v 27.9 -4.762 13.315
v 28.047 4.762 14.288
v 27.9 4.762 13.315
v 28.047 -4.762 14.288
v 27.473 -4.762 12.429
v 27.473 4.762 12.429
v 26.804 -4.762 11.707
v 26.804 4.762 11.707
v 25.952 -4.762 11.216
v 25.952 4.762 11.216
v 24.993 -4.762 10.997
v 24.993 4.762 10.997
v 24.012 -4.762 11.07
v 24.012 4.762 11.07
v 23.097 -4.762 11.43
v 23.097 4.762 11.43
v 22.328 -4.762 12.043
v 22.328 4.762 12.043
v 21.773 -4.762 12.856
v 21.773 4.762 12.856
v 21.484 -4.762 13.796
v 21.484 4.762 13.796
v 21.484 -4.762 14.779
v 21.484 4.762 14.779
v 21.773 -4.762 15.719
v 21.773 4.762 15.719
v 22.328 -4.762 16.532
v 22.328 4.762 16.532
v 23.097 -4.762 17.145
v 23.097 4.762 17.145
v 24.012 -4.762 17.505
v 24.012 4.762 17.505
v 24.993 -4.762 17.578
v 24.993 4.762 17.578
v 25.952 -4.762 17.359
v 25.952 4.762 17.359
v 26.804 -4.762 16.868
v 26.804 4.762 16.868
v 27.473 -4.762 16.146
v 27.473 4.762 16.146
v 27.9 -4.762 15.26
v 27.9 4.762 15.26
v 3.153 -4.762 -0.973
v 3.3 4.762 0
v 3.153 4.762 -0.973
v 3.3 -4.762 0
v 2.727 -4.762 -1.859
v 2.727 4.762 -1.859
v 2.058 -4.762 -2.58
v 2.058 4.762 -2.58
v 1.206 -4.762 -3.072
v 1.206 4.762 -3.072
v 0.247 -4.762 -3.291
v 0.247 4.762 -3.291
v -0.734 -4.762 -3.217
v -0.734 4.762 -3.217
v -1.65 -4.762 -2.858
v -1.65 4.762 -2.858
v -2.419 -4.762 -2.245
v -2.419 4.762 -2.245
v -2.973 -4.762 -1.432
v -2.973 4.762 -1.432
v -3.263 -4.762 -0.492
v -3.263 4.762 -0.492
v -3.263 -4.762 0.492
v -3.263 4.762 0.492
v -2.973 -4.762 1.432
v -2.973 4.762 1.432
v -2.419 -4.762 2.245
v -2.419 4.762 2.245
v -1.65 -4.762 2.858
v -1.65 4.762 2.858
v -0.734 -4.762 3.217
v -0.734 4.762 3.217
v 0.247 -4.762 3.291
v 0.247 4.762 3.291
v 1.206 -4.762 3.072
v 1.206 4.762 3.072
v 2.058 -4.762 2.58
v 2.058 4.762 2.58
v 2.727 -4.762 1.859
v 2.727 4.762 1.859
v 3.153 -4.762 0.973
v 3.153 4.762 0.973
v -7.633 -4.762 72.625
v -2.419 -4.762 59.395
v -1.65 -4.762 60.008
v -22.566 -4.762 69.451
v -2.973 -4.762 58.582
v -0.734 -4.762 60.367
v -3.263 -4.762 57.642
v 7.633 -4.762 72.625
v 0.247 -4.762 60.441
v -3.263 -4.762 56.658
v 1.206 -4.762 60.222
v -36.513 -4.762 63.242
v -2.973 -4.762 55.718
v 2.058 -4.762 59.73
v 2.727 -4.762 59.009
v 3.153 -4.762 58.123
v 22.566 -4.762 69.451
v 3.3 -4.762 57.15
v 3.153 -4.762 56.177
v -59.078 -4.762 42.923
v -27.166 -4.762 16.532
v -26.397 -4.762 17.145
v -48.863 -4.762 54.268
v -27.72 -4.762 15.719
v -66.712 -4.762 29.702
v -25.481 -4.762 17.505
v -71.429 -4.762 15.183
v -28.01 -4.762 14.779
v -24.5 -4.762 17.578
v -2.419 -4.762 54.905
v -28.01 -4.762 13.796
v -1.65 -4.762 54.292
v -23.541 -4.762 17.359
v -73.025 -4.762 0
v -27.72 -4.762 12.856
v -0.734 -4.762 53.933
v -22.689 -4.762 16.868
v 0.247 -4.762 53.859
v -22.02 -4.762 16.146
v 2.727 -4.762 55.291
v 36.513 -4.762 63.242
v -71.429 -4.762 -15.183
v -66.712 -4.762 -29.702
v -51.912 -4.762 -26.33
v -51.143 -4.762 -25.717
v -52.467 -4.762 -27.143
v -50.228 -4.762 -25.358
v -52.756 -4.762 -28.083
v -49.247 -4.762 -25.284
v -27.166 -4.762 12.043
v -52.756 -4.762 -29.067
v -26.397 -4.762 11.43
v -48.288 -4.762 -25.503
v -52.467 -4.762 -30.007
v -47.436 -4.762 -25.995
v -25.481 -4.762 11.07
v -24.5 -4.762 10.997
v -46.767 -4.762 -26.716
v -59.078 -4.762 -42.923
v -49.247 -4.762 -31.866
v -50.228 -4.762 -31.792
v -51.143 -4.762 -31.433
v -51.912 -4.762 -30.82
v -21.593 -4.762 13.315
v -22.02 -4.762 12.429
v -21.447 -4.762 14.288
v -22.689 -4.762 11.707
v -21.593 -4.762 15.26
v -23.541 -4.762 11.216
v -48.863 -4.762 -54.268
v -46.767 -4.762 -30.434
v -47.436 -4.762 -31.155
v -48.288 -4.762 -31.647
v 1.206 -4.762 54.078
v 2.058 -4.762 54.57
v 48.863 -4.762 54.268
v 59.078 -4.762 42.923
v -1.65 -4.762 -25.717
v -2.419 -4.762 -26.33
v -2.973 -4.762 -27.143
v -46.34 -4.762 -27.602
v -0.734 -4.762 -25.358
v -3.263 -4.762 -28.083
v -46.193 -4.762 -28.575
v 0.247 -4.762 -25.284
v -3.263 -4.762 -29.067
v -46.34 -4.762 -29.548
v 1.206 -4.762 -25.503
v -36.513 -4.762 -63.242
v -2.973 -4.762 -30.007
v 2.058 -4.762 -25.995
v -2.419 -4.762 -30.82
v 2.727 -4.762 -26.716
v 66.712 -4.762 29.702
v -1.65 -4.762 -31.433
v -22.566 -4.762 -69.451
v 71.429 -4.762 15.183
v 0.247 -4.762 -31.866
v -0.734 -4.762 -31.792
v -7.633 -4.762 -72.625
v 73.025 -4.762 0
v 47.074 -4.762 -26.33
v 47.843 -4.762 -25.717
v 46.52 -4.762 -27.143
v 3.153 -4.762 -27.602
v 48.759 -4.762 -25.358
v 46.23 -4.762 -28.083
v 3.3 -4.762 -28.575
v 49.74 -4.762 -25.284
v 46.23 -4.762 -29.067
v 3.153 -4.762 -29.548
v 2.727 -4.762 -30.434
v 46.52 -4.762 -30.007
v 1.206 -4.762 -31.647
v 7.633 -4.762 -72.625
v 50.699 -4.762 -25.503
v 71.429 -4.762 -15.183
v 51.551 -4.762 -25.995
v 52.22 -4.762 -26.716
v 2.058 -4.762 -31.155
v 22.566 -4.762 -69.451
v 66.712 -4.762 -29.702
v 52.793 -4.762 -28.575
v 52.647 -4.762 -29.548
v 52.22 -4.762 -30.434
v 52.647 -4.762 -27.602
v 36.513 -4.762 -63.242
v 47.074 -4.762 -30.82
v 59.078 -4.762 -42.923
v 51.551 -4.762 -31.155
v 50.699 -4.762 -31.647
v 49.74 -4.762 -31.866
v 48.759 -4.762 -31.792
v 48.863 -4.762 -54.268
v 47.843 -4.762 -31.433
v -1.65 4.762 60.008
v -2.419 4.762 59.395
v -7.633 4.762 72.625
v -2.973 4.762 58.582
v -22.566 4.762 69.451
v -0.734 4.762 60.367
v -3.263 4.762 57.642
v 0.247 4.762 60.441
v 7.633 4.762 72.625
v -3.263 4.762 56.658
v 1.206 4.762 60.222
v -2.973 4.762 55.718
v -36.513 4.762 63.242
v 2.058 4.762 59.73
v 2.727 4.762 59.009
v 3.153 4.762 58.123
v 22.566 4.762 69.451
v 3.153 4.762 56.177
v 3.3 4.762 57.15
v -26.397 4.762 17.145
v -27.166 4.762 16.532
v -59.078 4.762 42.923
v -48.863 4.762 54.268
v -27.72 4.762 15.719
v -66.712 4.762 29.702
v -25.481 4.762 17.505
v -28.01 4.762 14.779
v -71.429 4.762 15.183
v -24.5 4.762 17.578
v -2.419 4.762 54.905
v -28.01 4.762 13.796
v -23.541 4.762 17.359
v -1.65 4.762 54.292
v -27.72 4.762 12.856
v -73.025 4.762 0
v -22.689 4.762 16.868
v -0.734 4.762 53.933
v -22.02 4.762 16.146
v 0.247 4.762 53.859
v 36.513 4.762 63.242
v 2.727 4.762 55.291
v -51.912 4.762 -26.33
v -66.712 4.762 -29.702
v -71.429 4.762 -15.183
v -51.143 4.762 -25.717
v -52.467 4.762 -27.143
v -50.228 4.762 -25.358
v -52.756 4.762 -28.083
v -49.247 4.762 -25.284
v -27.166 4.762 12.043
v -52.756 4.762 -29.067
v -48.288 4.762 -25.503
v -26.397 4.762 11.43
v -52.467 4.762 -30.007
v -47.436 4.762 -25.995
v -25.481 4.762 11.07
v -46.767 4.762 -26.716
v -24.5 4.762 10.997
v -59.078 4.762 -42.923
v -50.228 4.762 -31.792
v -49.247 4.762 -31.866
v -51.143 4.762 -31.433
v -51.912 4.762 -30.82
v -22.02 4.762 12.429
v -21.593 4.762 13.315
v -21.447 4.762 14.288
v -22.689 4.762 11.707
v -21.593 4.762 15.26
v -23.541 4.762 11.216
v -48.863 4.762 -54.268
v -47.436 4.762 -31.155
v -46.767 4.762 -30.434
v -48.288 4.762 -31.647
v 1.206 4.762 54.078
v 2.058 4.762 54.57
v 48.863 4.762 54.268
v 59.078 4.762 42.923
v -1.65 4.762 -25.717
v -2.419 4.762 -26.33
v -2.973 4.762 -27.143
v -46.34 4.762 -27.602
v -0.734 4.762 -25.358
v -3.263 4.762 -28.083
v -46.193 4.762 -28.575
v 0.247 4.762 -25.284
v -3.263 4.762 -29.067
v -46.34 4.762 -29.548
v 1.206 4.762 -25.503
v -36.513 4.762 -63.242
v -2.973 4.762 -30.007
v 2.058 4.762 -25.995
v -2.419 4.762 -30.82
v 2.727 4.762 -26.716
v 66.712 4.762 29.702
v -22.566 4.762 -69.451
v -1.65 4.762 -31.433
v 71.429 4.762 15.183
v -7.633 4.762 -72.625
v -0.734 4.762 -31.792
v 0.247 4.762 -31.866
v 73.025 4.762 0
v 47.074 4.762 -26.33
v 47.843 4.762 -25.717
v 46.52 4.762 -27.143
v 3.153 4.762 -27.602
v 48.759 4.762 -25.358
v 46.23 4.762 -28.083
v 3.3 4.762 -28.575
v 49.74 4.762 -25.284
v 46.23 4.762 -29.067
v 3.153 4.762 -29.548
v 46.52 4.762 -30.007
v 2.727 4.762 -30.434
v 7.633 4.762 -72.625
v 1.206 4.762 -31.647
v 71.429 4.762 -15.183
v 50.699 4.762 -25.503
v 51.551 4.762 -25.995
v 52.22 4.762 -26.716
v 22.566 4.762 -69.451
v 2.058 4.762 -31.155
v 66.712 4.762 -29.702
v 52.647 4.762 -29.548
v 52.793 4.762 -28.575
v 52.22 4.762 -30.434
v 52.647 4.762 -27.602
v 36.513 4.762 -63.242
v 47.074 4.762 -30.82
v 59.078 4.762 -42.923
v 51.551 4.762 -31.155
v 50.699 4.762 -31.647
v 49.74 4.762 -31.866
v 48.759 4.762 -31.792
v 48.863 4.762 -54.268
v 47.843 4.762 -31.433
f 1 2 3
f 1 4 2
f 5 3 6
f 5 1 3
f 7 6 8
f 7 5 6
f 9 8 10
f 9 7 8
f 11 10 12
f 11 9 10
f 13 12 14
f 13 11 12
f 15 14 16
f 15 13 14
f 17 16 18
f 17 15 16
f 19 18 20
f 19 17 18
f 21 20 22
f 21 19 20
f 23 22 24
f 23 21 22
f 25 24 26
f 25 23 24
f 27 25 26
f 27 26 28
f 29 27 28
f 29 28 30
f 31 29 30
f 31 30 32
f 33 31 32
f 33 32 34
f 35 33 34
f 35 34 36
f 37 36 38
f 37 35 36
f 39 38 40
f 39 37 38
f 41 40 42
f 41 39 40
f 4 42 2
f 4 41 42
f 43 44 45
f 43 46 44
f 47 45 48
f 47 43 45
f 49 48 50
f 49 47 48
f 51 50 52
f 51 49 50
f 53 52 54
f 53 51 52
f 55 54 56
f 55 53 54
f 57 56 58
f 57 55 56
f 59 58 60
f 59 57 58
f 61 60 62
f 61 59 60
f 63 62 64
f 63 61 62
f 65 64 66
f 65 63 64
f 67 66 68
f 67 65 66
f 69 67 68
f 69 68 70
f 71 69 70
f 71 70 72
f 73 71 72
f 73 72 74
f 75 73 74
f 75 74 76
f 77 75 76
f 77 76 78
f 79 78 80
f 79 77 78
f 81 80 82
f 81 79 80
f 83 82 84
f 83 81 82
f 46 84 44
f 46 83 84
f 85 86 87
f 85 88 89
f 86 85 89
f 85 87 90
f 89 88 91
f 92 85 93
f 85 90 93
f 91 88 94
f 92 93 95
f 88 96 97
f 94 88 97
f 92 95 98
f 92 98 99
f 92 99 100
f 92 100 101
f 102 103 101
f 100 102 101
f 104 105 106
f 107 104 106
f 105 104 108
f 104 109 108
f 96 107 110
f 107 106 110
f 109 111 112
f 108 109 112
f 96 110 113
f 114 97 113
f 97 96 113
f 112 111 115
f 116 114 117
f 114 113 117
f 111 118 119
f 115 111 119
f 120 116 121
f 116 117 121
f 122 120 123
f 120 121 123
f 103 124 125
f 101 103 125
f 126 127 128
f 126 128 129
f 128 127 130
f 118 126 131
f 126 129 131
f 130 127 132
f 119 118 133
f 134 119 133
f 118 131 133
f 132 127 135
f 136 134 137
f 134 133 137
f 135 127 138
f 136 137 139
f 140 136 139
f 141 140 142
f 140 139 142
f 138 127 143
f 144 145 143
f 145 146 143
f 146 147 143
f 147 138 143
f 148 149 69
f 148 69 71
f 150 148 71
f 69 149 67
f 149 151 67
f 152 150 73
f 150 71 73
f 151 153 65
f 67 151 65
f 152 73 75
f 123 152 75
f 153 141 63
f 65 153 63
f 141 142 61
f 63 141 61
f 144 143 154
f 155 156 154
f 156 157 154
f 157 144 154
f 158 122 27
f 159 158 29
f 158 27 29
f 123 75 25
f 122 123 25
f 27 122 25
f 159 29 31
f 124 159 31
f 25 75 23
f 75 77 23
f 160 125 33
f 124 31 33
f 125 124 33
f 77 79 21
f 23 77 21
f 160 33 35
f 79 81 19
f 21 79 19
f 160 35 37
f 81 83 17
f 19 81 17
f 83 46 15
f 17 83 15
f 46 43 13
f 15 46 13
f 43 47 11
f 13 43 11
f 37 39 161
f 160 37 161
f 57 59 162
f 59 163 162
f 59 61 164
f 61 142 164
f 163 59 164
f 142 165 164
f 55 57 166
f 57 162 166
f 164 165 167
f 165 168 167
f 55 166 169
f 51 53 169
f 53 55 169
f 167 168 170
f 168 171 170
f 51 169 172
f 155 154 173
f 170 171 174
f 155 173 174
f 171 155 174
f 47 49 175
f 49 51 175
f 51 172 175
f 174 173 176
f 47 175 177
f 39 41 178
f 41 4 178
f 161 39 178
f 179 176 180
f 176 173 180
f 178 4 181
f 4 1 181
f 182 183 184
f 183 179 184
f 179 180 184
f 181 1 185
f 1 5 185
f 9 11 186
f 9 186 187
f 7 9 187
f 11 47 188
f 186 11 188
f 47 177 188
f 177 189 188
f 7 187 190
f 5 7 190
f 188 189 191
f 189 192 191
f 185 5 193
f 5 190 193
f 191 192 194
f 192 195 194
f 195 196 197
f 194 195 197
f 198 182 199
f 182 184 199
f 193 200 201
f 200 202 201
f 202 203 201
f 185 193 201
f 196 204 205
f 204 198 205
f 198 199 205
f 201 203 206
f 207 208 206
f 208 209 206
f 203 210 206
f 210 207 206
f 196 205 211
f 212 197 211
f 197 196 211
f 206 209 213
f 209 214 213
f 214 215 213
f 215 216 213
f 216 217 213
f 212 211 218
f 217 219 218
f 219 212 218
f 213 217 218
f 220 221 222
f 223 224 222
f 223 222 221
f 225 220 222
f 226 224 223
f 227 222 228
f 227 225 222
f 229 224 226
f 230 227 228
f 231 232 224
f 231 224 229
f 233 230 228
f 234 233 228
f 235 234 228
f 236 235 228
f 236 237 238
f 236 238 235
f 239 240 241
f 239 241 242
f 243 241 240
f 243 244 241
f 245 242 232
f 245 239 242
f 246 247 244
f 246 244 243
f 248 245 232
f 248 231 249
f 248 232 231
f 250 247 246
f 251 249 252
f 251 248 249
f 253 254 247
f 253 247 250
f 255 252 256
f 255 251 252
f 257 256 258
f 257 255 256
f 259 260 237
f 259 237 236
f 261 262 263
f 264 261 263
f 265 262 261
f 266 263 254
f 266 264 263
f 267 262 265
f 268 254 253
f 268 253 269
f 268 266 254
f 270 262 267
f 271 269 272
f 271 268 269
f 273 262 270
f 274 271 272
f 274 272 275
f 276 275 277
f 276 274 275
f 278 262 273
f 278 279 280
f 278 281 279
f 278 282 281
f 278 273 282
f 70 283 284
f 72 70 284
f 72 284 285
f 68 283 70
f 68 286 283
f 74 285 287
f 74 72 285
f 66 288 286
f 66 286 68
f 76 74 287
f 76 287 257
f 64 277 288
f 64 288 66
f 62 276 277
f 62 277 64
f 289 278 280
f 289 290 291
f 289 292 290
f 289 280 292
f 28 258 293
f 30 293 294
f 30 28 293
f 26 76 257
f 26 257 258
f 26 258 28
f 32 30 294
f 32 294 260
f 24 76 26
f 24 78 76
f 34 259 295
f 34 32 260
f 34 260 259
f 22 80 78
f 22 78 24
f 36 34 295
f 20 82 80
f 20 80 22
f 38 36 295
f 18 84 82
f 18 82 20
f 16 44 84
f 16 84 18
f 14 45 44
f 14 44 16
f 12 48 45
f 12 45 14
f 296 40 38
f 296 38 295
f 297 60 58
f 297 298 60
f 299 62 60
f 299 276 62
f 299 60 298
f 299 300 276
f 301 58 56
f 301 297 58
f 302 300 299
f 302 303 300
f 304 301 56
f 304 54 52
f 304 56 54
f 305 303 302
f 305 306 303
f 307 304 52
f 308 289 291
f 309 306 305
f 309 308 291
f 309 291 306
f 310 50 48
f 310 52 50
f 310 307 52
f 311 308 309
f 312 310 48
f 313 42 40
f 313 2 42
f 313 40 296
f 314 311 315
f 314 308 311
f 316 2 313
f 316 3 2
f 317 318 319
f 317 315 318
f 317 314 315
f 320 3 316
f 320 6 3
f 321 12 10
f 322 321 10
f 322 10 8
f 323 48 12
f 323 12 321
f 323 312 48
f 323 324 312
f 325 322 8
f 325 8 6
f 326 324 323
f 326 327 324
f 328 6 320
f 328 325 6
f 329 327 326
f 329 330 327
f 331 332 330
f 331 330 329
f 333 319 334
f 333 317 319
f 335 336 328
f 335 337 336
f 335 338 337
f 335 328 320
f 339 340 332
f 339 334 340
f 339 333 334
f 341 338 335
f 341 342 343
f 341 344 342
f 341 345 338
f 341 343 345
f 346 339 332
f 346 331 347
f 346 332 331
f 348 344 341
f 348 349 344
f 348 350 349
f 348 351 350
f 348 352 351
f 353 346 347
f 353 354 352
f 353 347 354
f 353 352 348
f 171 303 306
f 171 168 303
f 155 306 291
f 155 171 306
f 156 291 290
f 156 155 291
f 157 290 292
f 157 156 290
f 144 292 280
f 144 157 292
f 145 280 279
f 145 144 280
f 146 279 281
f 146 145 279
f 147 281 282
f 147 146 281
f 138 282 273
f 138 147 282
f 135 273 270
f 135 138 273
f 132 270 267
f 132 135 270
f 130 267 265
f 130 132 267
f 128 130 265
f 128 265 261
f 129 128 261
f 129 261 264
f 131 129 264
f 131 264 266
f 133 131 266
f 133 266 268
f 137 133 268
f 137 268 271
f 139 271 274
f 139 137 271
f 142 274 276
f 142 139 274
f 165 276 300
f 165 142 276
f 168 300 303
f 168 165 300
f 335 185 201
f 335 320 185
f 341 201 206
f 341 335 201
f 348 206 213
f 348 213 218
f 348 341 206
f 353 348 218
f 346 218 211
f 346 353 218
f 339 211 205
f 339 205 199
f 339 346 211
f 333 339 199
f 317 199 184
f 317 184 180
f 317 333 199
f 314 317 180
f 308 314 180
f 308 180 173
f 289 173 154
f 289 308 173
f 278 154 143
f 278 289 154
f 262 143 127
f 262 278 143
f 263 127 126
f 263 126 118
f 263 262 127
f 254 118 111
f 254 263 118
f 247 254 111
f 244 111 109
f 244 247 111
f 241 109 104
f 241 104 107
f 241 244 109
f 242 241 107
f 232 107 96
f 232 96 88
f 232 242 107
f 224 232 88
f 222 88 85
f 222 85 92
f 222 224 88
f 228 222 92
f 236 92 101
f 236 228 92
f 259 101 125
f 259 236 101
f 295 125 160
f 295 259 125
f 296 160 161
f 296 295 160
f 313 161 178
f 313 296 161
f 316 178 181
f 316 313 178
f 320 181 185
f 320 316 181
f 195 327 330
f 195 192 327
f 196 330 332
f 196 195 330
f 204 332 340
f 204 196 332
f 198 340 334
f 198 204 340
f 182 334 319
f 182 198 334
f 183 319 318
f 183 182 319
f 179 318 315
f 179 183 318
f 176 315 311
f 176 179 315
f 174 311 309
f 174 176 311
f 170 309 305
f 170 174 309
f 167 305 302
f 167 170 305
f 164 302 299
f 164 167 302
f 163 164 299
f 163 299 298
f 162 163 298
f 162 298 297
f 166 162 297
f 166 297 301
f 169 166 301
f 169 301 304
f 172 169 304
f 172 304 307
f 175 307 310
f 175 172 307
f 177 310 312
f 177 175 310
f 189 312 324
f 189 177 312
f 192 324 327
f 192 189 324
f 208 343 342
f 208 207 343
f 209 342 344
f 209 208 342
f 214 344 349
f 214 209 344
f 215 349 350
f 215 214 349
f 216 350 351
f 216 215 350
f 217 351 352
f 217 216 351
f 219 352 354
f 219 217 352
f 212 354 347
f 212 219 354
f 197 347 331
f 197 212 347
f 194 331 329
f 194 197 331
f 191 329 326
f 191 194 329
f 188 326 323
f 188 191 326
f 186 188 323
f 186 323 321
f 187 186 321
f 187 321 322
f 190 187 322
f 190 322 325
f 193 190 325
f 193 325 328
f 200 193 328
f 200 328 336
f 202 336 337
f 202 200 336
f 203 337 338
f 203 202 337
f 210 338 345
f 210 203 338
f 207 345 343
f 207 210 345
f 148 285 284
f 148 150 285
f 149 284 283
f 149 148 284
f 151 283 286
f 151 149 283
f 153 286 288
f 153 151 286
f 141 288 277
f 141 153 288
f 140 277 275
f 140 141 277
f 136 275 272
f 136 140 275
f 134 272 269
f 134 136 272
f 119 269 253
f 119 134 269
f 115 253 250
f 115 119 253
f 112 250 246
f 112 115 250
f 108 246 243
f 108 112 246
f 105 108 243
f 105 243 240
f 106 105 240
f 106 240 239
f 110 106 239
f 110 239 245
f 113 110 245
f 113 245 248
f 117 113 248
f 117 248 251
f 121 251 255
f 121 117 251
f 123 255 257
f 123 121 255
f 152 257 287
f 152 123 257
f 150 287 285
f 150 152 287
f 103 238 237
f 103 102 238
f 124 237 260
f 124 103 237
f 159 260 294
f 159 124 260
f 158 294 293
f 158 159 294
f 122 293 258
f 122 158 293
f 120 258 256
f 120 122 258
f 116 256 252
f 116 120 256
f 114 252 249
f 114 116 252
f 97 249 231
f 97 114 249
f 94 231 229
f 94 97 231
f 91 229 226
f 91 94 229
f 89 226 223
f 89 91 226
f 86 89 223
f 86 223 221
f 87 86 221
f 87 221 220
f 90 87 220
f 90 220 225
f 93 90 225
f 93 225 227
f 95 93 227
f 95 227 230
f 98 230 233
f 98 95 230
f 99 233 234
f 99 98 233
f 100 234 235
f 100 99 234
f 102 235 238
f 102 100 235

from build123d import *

# Parameters (mm, degrees)
SKETCH1_R           = 73.025
SKETCH1_R_2         = 3.3
BOSS_EXTRUDE1_DEPTH = 4.7625


with BuildPart() as part:
    # Sketch1 → Boss-Extrude1 (new body, symmetric)
    with BuildSketch(Plane(origin=(0, 0, 0), x_dir=(1, 0, 0), z_dir=(0, 1, 0))):
        Circle(SKETCH1_R)
        Circle(SKETCH1_R_2, mode=Mode.SUBTRACT)
        with Locations((0, -57.15)):
            Circle(SKETCH1_R_2, mode=Mode.SUBTRACT)
        with Locations((-49.493351826, 28.575)):
            Circle(SKETCH1_R_2, mode=Mode.SUBTRACT)
        with Locations((49.493351826, 28.575)):
            Circle(SKETCH1_R_2, mode=Mode.SUBTRACT)
        with Locations((24.746675913, -14.2875)):
            Circle(SKETCH1_R_2, mode=Mode.SUBTRACT)
        with Locations((-24.746675913, -14.2875)):
            Circle(SKETCH1_R_2, mode=Mode.SUBTRACT)
        with Locations((0, 28.575)):
            Circle(SKETCH1_R_2, mode=Mode.SUBTRACT)
    extrude(amount=BOSS_EXTRUDE1_DEPTH, both=True)


solid = part.part
